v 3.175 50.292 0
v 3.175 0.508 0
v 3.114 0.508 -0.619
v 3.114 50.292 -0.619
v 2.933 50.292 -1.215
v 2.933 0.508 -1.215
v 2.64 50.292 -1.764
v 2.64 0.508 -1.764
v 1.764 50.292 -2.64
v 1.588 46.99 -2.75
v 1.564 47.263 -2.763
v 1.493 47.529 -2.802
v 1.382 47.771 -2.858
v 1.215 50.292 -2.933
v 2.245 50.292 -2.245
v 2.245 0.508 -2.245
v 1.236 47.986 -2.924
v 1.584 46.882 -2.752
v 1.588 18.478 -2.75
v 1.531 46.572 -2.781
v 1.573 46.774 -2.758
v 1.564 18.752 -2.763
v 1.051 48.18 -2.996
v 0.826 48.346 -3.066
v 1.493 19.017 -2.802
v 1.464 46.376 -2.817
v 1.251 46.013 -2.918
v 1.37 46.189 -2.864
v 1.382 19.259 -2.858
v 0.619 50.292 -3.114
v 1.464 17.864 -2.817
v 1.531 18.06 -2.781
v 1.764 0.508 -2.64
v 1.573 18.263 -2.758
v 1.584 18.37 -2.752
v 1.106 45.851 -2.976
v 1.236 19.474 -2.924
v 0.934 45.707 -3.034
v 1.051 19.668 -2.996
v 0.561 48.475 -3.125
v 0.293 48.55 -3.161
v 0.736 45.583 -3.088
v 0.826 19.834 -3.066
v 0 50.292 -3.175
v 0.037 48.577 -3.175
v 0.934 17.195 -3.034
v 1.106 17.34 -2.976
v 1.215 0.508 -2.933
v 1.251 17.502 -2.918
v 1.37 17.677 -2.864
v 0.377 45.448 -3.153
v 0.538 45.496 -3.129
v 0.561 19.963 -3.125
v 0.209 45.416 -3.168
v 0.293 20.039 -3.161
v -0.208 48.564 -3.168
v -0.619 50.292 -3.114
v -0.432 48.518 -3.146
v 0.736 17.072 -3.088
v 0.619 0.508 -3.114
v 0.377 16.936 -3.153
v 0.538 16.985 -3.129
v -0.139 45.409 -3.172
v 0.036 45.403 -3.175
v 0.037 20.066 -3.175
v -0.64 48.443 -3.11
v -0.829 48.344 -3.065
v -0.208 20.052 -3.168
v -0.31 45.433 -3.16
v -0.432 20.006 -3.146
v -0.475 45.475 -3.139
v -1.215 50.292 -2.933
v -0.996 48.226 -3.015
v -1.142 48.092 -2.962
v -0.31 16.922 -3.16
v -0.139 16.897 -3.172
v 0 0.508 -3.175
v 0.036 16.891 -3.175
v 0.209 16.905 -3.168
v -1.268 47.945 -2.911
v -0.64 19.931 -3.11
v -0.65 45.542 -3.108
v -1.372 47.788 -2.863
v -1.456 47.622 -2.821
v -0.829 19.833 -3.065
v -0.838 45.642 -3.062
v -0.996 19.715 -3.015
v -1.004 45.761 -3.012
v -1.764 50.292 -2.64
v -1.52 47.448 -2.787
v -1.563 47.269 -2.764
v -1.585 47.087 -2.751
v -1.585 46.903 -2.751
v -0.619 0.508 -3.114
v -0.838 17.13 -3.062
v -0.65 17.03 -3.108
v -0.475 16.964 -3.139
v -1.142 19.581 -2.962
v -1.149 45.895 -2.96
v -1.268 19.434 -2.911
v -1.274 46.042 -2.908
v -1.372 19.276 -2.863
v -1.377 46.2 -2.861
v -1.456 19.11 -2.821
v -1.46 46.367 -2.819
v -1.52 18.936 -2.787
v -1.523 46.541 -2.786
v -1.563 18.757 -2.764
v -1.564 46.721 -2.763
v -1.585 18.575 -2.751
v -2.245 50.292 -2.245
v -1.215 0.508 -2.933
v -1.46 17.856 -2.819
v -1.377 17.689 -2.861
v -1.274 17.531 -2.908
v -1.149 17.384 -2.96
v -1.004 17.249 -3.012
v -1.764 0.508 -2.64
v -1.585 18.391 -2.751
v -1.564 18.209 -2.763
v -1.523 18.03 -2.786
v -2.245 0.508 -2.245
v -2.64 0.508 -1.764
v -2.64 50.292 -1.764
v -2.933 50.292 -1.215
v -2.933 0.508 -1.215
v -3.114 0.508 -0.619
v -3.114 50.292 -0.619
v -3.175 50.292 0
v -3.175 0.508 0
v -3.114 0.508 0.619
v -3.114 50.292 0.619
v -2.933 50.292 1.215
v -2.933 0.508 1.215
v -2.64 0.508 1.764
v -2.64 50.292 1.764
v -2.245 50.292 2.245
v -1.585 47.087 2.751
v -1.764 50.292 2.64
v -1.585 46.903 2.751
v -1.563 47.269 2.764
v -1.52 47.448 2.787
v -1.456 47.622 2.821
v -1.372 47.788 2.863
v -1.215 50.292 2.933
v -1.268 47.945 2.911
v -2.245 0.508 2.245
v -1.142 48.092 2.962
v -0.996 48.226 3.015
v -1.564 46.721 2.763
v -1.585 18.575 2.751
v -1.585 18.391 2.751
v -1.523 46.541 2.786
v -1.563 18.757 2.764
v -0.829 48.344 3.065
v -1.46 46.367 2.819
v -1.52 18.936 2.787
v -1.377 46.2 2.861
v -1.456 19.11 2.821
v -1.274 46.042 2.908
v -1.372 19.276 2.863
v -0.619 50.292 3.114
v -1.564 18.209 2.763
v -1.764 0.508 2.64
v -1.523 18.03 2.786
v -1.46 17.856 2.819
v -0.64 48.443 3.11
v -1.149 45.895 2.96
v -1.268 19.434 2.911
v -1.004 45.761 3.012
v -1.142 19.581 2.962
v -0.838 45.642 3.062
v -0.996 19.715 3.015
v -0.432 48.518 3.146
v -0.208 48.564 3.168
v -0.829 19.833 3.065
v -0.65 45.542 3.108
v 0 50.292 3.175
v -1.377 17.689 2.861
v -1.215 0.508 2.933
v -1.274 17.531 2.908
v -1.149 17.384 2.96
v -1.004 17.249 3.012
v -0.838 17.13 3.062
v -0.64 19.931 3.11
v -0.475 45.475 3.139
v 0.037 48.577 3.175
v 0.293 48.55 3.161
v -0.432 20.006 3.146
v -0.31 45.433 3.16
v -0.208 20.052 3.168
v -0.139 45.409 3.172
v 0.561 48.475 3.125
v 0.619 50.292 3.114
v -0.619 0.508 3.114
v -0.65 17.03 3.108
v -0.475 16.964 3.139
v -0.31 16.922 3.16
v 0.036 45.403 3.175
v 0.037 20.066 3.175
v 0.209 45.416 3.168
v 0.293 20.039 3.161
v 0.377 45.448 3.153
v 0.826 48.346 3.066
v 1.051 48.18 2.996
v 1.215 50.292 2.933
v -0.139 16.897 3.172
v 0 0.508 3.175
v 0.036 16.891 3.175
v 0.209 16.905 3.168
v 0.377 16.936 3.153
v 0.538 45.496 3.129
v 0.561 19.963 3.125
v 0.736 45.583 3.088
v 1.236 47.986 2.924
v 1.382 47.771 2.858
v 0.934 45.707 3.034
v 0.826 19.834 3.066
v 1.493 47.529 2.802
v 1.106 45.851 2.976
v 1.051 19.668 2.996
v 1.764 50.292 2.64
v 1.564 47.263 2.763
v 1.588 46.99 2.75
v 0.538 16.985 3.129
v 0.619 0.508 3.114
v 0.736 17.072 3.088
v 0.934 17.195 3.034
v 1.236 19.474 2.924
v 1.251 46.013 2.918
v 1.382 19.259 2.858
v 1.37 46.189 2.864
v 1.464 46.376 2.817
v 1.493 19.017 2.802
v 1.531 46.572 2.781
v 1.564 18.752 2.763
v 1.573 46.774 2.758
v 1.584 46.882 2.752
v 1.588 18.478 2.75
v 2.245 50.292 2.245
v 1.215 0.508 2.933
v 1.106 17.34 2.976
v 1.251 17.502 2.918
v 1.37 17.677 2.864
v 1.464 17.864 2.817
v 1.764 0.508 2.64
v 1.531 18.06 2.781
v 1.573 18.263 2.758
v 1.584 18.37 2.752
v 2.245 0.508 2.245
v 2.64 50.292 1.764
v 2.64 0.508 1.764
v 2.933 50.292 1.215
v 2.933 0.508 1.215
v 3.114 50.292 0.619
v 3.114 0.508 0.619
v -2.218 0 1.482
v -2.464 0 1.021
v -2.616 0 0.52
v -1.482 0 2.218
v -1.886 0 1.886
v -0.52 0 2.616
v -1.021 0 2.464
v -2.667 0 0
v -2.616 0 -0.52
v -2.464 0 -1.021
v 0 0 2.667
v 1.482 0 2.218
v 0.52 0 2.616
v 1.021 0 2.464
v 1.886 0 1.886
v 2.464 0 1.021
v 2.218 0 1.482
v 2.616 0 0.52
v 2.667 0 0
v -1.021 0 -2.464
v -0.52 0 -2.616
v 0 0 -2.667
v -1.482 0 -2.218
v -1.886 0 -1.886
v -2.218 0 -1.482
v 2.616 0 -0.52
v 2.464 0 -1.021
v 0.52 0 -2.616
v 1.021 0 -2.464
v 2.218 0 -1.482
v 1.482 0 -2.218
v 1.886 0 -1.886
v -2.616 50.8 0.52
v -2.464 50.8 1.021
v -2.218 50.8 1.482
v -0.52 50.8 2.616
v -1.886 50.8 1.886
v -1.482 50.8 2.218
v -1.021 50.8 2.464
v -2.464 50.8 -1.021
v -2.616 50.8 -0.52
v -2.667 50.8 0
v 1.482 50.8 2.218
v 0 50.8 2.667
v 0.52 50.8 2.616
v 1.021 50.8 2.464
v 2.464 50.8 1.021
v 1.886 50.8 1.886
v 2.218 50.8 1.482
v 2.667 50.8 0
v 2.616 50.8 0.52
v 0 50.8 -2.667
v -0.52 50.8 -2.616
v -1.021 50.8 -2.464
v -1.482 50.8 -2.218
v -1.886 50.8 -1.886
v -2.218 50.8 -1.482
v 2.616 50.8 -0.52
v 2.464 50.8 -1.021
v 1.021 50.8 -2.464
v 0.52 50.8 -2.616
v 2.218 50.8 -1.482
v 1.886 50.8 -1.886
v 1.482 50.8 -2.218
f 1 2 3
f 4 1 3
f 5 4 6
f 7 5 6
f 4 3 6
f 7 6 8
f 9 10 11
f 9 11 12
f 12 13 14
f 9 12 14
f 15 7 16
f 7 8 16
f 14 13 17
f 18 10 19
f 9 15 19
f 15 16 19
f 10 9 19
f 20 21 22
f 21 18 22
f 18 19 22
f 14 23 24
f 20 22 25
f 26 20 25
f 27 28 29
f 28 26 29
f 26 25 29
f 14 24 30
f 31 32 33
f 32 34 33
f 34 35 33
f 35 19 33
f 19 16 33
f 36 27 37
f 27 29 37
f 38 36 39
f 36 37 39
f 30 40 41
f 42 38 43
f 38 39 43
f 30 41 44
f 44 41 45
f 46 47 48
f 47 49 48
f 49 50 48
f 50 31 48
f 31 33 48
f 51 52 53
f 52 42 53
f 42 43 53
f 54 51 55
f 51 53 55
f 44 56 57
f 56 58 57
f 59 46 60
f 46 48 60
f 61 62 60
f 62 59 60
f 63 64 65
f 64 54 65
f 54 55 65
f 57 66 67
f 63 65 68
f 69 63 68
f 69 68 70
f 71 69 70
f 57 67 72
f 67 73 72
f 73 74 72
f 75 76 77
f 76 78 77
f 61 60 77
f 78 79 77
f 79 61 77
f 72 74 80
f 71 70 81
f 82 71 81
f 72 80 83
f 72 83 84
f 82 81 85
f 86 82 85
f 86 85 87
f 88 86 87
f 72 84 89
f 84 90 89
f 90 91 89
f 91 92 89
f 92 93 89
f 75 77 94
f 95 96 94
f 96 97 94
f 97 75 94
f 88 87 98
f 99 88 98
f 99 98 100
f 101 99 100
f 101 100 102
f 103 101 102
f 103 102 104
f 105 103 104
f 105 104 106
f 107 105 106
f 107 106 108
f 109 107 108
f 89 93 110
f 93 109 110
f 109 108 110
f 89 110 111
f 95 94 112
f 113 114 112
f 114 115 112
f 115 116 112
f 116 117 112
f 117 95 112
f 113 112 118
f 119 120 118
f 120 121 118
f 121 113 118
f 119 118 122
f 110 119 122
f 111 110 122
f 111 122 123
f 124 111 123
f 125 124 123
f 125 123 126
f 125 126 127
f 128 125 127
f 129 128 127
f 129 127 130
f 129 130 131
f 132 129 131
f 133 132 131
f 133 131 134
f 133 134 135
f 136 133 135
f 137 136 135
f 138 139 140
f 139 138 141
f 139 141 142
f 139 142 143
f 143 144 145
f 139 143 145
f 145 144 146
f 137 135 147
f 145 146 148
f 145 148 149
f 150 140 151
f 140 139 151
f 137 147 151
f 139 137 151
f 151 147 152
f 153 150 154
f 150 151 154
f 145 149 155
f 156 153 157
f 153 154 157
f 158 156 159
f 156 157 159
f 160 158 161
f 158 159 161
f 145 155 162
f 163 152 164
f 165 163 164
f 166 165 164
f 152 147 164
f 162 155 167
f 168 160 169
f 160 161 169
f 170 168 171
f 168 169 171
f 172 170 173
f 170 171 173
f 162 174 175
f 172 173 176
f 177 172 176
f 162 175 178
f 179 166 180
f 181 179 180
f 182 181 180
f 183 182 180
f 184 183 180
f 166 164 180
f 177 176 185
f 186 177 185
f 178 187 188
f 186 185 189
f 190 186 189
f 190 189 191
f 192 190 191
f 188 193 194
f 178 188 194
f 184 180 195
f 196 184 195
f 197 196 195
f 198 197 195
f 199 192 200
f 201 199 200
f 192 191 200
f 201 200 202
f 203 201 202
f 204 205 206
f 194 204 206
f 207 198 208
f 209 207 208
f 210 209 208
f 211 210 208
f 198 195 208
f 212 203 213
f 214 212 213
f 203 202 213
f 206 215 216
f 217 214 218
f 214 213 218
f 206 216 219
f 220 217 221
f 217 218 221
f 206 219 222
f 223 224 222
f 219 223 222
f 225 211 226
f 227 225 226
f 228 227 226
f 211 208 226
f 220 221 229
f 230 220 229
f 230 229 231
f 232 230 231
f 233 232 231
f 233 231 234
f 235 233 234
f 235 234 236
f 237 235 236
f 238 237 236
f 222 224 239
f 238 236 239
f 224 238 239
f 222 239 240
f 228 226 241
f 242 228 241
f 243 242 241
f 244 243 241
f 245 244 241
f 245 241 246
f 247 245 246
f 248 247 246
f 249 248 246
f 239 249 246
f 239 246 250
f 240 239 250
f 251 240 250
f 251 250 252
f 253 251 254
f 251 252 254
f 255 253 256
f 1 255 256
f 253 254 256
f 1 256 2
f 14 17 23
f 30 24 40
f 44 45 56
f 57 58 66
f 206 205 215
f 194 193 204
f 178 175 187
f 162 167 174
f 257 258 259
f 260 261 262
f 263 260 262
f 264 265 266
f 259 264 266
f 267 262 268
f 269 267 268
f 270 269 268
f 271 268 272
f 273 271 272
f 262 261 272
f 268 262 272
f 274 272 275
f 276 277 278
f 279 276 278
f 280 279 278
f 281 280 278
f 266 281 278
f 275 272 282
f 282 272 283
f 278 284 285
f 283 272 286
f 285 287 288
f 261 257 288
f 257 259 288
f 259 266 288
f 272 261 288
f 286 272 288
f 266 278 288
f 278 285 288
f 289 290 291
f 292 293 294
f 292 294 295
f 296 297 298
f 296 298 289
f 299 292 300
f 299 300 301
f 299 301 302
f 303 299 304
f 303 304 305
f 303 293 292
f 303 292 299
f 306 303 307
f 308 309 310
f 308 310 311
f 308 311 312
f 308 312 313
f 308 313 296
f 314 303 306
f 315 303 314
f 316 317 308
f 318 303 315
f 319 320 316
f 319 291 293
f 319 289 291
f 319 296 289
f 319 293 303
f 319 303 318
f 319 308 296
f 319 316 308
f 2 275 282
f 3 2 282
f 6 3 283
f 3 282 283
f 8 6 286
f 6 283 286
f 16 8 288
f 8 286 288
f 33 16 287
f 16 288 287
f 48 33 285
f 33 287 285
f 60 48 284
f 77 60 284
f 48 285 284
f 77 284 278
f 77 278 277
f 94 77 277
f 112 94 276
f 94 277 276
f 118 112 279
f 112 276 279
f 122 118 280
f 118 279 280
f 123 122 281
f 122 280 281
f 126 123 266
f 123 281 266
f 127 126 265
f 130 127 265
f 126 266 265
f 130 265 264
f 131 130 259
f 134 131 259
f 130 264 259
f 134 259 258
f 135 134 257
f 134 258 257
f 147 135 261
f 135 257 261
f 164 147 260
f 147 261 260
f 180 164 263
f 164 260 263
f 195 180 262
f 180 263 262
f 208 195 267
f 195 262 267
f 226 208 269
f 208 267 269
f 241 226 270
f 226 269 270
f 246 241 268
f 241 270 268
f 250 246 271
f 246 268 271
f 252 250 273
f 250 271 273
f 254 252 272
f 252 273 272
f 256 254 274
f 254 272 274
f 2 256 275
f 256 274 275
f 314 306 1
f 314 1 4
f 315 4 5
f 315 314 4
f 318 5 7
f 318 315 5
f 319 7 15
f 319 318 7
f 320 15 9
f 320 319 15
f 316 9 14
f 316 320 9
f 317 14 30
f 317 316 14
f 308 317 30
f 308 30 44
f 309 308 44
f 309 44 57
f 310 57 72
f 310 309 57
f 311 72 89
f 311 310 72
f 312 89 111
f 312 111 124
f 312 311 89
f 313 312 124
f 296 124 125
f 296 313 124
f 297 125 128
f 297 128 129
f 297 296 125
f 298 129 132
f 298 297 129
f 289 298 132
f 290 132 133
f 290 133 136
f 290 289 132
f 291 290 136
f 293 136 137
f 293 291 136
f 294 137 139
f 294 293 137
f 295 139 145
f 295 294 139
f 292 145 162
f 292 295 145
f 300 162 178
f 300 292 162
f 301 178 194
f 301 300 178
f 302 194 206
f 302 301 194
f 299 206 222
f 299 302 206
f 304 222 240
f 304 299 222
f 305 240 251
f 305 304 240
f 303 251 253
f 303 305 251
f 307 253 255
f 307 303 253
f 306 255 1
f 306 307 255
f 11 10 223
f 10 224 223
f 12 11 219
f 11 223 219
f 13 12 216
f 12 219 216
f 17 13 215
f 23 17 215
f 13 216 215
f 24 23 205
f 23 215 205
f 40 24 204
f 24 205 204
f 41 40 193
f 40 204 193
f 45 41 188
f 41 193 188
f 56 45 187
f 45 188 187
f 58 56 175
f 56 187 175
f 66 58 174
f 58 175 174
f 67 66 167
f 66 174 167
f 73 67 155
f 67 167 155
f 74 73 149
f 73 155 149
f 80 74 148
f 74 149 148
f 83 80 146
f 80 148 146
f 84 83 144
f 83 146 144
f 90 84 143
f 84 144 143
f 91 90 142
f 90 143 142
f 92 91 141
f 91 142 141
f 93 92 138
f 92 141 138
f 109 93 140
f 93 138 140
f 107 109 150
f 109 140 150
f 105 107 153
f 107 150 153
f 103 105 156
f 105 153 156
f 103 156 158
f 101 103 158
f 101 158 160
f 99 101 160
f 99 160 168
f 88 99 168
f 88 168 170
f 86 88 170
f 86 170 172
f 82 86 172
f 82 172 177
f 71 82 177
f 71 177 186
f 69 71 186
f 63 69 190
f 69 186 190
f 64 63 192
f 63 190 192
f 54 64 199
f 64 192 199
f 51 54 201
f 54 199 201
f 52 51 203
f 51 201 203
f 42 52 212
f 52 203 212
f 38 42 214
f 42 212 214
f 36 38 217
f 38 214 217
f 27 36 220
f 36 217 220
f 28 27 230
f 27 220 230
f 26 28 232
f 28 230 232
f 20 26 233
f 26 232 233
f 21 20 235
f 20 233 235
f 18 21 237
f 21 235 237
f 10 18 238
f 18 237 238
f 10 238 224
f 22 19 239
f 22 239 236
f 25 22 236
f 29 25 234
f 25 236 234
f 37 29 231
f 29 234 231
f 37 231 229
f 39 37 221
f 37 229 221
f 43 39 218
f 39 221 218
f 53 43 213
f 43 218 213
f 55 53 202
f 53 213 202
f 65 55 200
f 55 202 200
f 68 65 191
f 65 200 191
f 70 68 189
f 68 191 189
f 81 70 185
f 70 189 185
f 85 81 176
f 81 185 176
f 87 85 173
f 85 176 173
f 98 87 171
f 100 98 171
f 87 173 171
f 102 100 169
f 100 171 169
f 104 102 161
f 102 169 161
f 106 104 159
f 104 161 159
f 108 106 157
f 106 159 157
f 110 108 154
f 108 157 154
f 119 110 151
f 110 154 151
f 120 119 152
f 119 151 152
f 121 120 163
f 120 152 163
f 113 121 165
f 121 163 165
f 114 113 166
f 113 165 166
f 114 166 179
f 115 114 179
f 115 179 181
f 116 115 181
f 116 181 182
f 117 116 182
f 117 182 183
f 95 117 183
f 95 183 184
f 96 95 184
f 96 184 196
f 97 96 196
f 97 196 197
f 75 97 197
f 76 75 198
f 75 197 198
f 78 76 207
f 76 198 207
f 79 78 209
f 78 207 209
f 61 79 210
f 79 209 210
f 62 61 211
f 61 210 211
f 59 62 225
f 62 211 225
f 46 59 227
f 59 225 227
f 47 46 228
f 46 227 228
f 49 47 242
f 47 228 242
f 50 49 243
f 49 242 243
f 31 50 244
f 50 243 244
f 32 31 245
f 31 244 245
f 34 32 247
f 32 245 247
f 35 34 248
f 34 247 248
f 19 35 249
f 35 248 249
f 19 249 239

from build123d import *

# Parameters (mm, degrees)
SKETCH1_R               = 3.175
BOSS_EXTRUDE1_DEPTH     = 50.8
CHAMFER1_SIZE           = 0.508
CUT_EXTRUDE1_DEPTH      = 50.8
CUT_EXTRUDE1_DEPTH_BACK = 50.8
SKETCH2_R               = 1.5875


with BuildPart() as part:
    # Sketch1 → Boss-Extrude1 (new body)
    with BuildSketch(Plane(origin=(0, 0, 0), x_dir=(1, 0, 0), z_dir=(0, 1, 0))):
        Circle(SKETCH1_R)
    extrude(amount=BOSS_EXTRUDE1_DEPTH)

    # Chamfer1
    chamfer1_edges = [part.edges().sort_by_distance(p)[0] for p in [
        (-3.175, 0, 0),
        (-3.175, 50.8, 0),
    ]]
    chamfer(chamfer1_edges, length=CHAMFER1_SIZE)

    # Sketch2 → Cut-Extrude1 (cut, two sides: drawn at the far end of the back side and taken through both)
    with BuildSketch(Plane.XY.offset(-CUT_EXTRUDE1_DEPTH_BACK)):
        with Locations((0, 46.99)):
            Circle(SKETCH2_R)
        with Locations((0, 18.4785)):
            Circle(SKETCH2_R)
    extrude(amount=CUT_EXTRUDE1_DEPTH + CUT_EXTRUDE1_DEPTH_BACK, mode=Mode.SUBTRACT)


solid = part.part
